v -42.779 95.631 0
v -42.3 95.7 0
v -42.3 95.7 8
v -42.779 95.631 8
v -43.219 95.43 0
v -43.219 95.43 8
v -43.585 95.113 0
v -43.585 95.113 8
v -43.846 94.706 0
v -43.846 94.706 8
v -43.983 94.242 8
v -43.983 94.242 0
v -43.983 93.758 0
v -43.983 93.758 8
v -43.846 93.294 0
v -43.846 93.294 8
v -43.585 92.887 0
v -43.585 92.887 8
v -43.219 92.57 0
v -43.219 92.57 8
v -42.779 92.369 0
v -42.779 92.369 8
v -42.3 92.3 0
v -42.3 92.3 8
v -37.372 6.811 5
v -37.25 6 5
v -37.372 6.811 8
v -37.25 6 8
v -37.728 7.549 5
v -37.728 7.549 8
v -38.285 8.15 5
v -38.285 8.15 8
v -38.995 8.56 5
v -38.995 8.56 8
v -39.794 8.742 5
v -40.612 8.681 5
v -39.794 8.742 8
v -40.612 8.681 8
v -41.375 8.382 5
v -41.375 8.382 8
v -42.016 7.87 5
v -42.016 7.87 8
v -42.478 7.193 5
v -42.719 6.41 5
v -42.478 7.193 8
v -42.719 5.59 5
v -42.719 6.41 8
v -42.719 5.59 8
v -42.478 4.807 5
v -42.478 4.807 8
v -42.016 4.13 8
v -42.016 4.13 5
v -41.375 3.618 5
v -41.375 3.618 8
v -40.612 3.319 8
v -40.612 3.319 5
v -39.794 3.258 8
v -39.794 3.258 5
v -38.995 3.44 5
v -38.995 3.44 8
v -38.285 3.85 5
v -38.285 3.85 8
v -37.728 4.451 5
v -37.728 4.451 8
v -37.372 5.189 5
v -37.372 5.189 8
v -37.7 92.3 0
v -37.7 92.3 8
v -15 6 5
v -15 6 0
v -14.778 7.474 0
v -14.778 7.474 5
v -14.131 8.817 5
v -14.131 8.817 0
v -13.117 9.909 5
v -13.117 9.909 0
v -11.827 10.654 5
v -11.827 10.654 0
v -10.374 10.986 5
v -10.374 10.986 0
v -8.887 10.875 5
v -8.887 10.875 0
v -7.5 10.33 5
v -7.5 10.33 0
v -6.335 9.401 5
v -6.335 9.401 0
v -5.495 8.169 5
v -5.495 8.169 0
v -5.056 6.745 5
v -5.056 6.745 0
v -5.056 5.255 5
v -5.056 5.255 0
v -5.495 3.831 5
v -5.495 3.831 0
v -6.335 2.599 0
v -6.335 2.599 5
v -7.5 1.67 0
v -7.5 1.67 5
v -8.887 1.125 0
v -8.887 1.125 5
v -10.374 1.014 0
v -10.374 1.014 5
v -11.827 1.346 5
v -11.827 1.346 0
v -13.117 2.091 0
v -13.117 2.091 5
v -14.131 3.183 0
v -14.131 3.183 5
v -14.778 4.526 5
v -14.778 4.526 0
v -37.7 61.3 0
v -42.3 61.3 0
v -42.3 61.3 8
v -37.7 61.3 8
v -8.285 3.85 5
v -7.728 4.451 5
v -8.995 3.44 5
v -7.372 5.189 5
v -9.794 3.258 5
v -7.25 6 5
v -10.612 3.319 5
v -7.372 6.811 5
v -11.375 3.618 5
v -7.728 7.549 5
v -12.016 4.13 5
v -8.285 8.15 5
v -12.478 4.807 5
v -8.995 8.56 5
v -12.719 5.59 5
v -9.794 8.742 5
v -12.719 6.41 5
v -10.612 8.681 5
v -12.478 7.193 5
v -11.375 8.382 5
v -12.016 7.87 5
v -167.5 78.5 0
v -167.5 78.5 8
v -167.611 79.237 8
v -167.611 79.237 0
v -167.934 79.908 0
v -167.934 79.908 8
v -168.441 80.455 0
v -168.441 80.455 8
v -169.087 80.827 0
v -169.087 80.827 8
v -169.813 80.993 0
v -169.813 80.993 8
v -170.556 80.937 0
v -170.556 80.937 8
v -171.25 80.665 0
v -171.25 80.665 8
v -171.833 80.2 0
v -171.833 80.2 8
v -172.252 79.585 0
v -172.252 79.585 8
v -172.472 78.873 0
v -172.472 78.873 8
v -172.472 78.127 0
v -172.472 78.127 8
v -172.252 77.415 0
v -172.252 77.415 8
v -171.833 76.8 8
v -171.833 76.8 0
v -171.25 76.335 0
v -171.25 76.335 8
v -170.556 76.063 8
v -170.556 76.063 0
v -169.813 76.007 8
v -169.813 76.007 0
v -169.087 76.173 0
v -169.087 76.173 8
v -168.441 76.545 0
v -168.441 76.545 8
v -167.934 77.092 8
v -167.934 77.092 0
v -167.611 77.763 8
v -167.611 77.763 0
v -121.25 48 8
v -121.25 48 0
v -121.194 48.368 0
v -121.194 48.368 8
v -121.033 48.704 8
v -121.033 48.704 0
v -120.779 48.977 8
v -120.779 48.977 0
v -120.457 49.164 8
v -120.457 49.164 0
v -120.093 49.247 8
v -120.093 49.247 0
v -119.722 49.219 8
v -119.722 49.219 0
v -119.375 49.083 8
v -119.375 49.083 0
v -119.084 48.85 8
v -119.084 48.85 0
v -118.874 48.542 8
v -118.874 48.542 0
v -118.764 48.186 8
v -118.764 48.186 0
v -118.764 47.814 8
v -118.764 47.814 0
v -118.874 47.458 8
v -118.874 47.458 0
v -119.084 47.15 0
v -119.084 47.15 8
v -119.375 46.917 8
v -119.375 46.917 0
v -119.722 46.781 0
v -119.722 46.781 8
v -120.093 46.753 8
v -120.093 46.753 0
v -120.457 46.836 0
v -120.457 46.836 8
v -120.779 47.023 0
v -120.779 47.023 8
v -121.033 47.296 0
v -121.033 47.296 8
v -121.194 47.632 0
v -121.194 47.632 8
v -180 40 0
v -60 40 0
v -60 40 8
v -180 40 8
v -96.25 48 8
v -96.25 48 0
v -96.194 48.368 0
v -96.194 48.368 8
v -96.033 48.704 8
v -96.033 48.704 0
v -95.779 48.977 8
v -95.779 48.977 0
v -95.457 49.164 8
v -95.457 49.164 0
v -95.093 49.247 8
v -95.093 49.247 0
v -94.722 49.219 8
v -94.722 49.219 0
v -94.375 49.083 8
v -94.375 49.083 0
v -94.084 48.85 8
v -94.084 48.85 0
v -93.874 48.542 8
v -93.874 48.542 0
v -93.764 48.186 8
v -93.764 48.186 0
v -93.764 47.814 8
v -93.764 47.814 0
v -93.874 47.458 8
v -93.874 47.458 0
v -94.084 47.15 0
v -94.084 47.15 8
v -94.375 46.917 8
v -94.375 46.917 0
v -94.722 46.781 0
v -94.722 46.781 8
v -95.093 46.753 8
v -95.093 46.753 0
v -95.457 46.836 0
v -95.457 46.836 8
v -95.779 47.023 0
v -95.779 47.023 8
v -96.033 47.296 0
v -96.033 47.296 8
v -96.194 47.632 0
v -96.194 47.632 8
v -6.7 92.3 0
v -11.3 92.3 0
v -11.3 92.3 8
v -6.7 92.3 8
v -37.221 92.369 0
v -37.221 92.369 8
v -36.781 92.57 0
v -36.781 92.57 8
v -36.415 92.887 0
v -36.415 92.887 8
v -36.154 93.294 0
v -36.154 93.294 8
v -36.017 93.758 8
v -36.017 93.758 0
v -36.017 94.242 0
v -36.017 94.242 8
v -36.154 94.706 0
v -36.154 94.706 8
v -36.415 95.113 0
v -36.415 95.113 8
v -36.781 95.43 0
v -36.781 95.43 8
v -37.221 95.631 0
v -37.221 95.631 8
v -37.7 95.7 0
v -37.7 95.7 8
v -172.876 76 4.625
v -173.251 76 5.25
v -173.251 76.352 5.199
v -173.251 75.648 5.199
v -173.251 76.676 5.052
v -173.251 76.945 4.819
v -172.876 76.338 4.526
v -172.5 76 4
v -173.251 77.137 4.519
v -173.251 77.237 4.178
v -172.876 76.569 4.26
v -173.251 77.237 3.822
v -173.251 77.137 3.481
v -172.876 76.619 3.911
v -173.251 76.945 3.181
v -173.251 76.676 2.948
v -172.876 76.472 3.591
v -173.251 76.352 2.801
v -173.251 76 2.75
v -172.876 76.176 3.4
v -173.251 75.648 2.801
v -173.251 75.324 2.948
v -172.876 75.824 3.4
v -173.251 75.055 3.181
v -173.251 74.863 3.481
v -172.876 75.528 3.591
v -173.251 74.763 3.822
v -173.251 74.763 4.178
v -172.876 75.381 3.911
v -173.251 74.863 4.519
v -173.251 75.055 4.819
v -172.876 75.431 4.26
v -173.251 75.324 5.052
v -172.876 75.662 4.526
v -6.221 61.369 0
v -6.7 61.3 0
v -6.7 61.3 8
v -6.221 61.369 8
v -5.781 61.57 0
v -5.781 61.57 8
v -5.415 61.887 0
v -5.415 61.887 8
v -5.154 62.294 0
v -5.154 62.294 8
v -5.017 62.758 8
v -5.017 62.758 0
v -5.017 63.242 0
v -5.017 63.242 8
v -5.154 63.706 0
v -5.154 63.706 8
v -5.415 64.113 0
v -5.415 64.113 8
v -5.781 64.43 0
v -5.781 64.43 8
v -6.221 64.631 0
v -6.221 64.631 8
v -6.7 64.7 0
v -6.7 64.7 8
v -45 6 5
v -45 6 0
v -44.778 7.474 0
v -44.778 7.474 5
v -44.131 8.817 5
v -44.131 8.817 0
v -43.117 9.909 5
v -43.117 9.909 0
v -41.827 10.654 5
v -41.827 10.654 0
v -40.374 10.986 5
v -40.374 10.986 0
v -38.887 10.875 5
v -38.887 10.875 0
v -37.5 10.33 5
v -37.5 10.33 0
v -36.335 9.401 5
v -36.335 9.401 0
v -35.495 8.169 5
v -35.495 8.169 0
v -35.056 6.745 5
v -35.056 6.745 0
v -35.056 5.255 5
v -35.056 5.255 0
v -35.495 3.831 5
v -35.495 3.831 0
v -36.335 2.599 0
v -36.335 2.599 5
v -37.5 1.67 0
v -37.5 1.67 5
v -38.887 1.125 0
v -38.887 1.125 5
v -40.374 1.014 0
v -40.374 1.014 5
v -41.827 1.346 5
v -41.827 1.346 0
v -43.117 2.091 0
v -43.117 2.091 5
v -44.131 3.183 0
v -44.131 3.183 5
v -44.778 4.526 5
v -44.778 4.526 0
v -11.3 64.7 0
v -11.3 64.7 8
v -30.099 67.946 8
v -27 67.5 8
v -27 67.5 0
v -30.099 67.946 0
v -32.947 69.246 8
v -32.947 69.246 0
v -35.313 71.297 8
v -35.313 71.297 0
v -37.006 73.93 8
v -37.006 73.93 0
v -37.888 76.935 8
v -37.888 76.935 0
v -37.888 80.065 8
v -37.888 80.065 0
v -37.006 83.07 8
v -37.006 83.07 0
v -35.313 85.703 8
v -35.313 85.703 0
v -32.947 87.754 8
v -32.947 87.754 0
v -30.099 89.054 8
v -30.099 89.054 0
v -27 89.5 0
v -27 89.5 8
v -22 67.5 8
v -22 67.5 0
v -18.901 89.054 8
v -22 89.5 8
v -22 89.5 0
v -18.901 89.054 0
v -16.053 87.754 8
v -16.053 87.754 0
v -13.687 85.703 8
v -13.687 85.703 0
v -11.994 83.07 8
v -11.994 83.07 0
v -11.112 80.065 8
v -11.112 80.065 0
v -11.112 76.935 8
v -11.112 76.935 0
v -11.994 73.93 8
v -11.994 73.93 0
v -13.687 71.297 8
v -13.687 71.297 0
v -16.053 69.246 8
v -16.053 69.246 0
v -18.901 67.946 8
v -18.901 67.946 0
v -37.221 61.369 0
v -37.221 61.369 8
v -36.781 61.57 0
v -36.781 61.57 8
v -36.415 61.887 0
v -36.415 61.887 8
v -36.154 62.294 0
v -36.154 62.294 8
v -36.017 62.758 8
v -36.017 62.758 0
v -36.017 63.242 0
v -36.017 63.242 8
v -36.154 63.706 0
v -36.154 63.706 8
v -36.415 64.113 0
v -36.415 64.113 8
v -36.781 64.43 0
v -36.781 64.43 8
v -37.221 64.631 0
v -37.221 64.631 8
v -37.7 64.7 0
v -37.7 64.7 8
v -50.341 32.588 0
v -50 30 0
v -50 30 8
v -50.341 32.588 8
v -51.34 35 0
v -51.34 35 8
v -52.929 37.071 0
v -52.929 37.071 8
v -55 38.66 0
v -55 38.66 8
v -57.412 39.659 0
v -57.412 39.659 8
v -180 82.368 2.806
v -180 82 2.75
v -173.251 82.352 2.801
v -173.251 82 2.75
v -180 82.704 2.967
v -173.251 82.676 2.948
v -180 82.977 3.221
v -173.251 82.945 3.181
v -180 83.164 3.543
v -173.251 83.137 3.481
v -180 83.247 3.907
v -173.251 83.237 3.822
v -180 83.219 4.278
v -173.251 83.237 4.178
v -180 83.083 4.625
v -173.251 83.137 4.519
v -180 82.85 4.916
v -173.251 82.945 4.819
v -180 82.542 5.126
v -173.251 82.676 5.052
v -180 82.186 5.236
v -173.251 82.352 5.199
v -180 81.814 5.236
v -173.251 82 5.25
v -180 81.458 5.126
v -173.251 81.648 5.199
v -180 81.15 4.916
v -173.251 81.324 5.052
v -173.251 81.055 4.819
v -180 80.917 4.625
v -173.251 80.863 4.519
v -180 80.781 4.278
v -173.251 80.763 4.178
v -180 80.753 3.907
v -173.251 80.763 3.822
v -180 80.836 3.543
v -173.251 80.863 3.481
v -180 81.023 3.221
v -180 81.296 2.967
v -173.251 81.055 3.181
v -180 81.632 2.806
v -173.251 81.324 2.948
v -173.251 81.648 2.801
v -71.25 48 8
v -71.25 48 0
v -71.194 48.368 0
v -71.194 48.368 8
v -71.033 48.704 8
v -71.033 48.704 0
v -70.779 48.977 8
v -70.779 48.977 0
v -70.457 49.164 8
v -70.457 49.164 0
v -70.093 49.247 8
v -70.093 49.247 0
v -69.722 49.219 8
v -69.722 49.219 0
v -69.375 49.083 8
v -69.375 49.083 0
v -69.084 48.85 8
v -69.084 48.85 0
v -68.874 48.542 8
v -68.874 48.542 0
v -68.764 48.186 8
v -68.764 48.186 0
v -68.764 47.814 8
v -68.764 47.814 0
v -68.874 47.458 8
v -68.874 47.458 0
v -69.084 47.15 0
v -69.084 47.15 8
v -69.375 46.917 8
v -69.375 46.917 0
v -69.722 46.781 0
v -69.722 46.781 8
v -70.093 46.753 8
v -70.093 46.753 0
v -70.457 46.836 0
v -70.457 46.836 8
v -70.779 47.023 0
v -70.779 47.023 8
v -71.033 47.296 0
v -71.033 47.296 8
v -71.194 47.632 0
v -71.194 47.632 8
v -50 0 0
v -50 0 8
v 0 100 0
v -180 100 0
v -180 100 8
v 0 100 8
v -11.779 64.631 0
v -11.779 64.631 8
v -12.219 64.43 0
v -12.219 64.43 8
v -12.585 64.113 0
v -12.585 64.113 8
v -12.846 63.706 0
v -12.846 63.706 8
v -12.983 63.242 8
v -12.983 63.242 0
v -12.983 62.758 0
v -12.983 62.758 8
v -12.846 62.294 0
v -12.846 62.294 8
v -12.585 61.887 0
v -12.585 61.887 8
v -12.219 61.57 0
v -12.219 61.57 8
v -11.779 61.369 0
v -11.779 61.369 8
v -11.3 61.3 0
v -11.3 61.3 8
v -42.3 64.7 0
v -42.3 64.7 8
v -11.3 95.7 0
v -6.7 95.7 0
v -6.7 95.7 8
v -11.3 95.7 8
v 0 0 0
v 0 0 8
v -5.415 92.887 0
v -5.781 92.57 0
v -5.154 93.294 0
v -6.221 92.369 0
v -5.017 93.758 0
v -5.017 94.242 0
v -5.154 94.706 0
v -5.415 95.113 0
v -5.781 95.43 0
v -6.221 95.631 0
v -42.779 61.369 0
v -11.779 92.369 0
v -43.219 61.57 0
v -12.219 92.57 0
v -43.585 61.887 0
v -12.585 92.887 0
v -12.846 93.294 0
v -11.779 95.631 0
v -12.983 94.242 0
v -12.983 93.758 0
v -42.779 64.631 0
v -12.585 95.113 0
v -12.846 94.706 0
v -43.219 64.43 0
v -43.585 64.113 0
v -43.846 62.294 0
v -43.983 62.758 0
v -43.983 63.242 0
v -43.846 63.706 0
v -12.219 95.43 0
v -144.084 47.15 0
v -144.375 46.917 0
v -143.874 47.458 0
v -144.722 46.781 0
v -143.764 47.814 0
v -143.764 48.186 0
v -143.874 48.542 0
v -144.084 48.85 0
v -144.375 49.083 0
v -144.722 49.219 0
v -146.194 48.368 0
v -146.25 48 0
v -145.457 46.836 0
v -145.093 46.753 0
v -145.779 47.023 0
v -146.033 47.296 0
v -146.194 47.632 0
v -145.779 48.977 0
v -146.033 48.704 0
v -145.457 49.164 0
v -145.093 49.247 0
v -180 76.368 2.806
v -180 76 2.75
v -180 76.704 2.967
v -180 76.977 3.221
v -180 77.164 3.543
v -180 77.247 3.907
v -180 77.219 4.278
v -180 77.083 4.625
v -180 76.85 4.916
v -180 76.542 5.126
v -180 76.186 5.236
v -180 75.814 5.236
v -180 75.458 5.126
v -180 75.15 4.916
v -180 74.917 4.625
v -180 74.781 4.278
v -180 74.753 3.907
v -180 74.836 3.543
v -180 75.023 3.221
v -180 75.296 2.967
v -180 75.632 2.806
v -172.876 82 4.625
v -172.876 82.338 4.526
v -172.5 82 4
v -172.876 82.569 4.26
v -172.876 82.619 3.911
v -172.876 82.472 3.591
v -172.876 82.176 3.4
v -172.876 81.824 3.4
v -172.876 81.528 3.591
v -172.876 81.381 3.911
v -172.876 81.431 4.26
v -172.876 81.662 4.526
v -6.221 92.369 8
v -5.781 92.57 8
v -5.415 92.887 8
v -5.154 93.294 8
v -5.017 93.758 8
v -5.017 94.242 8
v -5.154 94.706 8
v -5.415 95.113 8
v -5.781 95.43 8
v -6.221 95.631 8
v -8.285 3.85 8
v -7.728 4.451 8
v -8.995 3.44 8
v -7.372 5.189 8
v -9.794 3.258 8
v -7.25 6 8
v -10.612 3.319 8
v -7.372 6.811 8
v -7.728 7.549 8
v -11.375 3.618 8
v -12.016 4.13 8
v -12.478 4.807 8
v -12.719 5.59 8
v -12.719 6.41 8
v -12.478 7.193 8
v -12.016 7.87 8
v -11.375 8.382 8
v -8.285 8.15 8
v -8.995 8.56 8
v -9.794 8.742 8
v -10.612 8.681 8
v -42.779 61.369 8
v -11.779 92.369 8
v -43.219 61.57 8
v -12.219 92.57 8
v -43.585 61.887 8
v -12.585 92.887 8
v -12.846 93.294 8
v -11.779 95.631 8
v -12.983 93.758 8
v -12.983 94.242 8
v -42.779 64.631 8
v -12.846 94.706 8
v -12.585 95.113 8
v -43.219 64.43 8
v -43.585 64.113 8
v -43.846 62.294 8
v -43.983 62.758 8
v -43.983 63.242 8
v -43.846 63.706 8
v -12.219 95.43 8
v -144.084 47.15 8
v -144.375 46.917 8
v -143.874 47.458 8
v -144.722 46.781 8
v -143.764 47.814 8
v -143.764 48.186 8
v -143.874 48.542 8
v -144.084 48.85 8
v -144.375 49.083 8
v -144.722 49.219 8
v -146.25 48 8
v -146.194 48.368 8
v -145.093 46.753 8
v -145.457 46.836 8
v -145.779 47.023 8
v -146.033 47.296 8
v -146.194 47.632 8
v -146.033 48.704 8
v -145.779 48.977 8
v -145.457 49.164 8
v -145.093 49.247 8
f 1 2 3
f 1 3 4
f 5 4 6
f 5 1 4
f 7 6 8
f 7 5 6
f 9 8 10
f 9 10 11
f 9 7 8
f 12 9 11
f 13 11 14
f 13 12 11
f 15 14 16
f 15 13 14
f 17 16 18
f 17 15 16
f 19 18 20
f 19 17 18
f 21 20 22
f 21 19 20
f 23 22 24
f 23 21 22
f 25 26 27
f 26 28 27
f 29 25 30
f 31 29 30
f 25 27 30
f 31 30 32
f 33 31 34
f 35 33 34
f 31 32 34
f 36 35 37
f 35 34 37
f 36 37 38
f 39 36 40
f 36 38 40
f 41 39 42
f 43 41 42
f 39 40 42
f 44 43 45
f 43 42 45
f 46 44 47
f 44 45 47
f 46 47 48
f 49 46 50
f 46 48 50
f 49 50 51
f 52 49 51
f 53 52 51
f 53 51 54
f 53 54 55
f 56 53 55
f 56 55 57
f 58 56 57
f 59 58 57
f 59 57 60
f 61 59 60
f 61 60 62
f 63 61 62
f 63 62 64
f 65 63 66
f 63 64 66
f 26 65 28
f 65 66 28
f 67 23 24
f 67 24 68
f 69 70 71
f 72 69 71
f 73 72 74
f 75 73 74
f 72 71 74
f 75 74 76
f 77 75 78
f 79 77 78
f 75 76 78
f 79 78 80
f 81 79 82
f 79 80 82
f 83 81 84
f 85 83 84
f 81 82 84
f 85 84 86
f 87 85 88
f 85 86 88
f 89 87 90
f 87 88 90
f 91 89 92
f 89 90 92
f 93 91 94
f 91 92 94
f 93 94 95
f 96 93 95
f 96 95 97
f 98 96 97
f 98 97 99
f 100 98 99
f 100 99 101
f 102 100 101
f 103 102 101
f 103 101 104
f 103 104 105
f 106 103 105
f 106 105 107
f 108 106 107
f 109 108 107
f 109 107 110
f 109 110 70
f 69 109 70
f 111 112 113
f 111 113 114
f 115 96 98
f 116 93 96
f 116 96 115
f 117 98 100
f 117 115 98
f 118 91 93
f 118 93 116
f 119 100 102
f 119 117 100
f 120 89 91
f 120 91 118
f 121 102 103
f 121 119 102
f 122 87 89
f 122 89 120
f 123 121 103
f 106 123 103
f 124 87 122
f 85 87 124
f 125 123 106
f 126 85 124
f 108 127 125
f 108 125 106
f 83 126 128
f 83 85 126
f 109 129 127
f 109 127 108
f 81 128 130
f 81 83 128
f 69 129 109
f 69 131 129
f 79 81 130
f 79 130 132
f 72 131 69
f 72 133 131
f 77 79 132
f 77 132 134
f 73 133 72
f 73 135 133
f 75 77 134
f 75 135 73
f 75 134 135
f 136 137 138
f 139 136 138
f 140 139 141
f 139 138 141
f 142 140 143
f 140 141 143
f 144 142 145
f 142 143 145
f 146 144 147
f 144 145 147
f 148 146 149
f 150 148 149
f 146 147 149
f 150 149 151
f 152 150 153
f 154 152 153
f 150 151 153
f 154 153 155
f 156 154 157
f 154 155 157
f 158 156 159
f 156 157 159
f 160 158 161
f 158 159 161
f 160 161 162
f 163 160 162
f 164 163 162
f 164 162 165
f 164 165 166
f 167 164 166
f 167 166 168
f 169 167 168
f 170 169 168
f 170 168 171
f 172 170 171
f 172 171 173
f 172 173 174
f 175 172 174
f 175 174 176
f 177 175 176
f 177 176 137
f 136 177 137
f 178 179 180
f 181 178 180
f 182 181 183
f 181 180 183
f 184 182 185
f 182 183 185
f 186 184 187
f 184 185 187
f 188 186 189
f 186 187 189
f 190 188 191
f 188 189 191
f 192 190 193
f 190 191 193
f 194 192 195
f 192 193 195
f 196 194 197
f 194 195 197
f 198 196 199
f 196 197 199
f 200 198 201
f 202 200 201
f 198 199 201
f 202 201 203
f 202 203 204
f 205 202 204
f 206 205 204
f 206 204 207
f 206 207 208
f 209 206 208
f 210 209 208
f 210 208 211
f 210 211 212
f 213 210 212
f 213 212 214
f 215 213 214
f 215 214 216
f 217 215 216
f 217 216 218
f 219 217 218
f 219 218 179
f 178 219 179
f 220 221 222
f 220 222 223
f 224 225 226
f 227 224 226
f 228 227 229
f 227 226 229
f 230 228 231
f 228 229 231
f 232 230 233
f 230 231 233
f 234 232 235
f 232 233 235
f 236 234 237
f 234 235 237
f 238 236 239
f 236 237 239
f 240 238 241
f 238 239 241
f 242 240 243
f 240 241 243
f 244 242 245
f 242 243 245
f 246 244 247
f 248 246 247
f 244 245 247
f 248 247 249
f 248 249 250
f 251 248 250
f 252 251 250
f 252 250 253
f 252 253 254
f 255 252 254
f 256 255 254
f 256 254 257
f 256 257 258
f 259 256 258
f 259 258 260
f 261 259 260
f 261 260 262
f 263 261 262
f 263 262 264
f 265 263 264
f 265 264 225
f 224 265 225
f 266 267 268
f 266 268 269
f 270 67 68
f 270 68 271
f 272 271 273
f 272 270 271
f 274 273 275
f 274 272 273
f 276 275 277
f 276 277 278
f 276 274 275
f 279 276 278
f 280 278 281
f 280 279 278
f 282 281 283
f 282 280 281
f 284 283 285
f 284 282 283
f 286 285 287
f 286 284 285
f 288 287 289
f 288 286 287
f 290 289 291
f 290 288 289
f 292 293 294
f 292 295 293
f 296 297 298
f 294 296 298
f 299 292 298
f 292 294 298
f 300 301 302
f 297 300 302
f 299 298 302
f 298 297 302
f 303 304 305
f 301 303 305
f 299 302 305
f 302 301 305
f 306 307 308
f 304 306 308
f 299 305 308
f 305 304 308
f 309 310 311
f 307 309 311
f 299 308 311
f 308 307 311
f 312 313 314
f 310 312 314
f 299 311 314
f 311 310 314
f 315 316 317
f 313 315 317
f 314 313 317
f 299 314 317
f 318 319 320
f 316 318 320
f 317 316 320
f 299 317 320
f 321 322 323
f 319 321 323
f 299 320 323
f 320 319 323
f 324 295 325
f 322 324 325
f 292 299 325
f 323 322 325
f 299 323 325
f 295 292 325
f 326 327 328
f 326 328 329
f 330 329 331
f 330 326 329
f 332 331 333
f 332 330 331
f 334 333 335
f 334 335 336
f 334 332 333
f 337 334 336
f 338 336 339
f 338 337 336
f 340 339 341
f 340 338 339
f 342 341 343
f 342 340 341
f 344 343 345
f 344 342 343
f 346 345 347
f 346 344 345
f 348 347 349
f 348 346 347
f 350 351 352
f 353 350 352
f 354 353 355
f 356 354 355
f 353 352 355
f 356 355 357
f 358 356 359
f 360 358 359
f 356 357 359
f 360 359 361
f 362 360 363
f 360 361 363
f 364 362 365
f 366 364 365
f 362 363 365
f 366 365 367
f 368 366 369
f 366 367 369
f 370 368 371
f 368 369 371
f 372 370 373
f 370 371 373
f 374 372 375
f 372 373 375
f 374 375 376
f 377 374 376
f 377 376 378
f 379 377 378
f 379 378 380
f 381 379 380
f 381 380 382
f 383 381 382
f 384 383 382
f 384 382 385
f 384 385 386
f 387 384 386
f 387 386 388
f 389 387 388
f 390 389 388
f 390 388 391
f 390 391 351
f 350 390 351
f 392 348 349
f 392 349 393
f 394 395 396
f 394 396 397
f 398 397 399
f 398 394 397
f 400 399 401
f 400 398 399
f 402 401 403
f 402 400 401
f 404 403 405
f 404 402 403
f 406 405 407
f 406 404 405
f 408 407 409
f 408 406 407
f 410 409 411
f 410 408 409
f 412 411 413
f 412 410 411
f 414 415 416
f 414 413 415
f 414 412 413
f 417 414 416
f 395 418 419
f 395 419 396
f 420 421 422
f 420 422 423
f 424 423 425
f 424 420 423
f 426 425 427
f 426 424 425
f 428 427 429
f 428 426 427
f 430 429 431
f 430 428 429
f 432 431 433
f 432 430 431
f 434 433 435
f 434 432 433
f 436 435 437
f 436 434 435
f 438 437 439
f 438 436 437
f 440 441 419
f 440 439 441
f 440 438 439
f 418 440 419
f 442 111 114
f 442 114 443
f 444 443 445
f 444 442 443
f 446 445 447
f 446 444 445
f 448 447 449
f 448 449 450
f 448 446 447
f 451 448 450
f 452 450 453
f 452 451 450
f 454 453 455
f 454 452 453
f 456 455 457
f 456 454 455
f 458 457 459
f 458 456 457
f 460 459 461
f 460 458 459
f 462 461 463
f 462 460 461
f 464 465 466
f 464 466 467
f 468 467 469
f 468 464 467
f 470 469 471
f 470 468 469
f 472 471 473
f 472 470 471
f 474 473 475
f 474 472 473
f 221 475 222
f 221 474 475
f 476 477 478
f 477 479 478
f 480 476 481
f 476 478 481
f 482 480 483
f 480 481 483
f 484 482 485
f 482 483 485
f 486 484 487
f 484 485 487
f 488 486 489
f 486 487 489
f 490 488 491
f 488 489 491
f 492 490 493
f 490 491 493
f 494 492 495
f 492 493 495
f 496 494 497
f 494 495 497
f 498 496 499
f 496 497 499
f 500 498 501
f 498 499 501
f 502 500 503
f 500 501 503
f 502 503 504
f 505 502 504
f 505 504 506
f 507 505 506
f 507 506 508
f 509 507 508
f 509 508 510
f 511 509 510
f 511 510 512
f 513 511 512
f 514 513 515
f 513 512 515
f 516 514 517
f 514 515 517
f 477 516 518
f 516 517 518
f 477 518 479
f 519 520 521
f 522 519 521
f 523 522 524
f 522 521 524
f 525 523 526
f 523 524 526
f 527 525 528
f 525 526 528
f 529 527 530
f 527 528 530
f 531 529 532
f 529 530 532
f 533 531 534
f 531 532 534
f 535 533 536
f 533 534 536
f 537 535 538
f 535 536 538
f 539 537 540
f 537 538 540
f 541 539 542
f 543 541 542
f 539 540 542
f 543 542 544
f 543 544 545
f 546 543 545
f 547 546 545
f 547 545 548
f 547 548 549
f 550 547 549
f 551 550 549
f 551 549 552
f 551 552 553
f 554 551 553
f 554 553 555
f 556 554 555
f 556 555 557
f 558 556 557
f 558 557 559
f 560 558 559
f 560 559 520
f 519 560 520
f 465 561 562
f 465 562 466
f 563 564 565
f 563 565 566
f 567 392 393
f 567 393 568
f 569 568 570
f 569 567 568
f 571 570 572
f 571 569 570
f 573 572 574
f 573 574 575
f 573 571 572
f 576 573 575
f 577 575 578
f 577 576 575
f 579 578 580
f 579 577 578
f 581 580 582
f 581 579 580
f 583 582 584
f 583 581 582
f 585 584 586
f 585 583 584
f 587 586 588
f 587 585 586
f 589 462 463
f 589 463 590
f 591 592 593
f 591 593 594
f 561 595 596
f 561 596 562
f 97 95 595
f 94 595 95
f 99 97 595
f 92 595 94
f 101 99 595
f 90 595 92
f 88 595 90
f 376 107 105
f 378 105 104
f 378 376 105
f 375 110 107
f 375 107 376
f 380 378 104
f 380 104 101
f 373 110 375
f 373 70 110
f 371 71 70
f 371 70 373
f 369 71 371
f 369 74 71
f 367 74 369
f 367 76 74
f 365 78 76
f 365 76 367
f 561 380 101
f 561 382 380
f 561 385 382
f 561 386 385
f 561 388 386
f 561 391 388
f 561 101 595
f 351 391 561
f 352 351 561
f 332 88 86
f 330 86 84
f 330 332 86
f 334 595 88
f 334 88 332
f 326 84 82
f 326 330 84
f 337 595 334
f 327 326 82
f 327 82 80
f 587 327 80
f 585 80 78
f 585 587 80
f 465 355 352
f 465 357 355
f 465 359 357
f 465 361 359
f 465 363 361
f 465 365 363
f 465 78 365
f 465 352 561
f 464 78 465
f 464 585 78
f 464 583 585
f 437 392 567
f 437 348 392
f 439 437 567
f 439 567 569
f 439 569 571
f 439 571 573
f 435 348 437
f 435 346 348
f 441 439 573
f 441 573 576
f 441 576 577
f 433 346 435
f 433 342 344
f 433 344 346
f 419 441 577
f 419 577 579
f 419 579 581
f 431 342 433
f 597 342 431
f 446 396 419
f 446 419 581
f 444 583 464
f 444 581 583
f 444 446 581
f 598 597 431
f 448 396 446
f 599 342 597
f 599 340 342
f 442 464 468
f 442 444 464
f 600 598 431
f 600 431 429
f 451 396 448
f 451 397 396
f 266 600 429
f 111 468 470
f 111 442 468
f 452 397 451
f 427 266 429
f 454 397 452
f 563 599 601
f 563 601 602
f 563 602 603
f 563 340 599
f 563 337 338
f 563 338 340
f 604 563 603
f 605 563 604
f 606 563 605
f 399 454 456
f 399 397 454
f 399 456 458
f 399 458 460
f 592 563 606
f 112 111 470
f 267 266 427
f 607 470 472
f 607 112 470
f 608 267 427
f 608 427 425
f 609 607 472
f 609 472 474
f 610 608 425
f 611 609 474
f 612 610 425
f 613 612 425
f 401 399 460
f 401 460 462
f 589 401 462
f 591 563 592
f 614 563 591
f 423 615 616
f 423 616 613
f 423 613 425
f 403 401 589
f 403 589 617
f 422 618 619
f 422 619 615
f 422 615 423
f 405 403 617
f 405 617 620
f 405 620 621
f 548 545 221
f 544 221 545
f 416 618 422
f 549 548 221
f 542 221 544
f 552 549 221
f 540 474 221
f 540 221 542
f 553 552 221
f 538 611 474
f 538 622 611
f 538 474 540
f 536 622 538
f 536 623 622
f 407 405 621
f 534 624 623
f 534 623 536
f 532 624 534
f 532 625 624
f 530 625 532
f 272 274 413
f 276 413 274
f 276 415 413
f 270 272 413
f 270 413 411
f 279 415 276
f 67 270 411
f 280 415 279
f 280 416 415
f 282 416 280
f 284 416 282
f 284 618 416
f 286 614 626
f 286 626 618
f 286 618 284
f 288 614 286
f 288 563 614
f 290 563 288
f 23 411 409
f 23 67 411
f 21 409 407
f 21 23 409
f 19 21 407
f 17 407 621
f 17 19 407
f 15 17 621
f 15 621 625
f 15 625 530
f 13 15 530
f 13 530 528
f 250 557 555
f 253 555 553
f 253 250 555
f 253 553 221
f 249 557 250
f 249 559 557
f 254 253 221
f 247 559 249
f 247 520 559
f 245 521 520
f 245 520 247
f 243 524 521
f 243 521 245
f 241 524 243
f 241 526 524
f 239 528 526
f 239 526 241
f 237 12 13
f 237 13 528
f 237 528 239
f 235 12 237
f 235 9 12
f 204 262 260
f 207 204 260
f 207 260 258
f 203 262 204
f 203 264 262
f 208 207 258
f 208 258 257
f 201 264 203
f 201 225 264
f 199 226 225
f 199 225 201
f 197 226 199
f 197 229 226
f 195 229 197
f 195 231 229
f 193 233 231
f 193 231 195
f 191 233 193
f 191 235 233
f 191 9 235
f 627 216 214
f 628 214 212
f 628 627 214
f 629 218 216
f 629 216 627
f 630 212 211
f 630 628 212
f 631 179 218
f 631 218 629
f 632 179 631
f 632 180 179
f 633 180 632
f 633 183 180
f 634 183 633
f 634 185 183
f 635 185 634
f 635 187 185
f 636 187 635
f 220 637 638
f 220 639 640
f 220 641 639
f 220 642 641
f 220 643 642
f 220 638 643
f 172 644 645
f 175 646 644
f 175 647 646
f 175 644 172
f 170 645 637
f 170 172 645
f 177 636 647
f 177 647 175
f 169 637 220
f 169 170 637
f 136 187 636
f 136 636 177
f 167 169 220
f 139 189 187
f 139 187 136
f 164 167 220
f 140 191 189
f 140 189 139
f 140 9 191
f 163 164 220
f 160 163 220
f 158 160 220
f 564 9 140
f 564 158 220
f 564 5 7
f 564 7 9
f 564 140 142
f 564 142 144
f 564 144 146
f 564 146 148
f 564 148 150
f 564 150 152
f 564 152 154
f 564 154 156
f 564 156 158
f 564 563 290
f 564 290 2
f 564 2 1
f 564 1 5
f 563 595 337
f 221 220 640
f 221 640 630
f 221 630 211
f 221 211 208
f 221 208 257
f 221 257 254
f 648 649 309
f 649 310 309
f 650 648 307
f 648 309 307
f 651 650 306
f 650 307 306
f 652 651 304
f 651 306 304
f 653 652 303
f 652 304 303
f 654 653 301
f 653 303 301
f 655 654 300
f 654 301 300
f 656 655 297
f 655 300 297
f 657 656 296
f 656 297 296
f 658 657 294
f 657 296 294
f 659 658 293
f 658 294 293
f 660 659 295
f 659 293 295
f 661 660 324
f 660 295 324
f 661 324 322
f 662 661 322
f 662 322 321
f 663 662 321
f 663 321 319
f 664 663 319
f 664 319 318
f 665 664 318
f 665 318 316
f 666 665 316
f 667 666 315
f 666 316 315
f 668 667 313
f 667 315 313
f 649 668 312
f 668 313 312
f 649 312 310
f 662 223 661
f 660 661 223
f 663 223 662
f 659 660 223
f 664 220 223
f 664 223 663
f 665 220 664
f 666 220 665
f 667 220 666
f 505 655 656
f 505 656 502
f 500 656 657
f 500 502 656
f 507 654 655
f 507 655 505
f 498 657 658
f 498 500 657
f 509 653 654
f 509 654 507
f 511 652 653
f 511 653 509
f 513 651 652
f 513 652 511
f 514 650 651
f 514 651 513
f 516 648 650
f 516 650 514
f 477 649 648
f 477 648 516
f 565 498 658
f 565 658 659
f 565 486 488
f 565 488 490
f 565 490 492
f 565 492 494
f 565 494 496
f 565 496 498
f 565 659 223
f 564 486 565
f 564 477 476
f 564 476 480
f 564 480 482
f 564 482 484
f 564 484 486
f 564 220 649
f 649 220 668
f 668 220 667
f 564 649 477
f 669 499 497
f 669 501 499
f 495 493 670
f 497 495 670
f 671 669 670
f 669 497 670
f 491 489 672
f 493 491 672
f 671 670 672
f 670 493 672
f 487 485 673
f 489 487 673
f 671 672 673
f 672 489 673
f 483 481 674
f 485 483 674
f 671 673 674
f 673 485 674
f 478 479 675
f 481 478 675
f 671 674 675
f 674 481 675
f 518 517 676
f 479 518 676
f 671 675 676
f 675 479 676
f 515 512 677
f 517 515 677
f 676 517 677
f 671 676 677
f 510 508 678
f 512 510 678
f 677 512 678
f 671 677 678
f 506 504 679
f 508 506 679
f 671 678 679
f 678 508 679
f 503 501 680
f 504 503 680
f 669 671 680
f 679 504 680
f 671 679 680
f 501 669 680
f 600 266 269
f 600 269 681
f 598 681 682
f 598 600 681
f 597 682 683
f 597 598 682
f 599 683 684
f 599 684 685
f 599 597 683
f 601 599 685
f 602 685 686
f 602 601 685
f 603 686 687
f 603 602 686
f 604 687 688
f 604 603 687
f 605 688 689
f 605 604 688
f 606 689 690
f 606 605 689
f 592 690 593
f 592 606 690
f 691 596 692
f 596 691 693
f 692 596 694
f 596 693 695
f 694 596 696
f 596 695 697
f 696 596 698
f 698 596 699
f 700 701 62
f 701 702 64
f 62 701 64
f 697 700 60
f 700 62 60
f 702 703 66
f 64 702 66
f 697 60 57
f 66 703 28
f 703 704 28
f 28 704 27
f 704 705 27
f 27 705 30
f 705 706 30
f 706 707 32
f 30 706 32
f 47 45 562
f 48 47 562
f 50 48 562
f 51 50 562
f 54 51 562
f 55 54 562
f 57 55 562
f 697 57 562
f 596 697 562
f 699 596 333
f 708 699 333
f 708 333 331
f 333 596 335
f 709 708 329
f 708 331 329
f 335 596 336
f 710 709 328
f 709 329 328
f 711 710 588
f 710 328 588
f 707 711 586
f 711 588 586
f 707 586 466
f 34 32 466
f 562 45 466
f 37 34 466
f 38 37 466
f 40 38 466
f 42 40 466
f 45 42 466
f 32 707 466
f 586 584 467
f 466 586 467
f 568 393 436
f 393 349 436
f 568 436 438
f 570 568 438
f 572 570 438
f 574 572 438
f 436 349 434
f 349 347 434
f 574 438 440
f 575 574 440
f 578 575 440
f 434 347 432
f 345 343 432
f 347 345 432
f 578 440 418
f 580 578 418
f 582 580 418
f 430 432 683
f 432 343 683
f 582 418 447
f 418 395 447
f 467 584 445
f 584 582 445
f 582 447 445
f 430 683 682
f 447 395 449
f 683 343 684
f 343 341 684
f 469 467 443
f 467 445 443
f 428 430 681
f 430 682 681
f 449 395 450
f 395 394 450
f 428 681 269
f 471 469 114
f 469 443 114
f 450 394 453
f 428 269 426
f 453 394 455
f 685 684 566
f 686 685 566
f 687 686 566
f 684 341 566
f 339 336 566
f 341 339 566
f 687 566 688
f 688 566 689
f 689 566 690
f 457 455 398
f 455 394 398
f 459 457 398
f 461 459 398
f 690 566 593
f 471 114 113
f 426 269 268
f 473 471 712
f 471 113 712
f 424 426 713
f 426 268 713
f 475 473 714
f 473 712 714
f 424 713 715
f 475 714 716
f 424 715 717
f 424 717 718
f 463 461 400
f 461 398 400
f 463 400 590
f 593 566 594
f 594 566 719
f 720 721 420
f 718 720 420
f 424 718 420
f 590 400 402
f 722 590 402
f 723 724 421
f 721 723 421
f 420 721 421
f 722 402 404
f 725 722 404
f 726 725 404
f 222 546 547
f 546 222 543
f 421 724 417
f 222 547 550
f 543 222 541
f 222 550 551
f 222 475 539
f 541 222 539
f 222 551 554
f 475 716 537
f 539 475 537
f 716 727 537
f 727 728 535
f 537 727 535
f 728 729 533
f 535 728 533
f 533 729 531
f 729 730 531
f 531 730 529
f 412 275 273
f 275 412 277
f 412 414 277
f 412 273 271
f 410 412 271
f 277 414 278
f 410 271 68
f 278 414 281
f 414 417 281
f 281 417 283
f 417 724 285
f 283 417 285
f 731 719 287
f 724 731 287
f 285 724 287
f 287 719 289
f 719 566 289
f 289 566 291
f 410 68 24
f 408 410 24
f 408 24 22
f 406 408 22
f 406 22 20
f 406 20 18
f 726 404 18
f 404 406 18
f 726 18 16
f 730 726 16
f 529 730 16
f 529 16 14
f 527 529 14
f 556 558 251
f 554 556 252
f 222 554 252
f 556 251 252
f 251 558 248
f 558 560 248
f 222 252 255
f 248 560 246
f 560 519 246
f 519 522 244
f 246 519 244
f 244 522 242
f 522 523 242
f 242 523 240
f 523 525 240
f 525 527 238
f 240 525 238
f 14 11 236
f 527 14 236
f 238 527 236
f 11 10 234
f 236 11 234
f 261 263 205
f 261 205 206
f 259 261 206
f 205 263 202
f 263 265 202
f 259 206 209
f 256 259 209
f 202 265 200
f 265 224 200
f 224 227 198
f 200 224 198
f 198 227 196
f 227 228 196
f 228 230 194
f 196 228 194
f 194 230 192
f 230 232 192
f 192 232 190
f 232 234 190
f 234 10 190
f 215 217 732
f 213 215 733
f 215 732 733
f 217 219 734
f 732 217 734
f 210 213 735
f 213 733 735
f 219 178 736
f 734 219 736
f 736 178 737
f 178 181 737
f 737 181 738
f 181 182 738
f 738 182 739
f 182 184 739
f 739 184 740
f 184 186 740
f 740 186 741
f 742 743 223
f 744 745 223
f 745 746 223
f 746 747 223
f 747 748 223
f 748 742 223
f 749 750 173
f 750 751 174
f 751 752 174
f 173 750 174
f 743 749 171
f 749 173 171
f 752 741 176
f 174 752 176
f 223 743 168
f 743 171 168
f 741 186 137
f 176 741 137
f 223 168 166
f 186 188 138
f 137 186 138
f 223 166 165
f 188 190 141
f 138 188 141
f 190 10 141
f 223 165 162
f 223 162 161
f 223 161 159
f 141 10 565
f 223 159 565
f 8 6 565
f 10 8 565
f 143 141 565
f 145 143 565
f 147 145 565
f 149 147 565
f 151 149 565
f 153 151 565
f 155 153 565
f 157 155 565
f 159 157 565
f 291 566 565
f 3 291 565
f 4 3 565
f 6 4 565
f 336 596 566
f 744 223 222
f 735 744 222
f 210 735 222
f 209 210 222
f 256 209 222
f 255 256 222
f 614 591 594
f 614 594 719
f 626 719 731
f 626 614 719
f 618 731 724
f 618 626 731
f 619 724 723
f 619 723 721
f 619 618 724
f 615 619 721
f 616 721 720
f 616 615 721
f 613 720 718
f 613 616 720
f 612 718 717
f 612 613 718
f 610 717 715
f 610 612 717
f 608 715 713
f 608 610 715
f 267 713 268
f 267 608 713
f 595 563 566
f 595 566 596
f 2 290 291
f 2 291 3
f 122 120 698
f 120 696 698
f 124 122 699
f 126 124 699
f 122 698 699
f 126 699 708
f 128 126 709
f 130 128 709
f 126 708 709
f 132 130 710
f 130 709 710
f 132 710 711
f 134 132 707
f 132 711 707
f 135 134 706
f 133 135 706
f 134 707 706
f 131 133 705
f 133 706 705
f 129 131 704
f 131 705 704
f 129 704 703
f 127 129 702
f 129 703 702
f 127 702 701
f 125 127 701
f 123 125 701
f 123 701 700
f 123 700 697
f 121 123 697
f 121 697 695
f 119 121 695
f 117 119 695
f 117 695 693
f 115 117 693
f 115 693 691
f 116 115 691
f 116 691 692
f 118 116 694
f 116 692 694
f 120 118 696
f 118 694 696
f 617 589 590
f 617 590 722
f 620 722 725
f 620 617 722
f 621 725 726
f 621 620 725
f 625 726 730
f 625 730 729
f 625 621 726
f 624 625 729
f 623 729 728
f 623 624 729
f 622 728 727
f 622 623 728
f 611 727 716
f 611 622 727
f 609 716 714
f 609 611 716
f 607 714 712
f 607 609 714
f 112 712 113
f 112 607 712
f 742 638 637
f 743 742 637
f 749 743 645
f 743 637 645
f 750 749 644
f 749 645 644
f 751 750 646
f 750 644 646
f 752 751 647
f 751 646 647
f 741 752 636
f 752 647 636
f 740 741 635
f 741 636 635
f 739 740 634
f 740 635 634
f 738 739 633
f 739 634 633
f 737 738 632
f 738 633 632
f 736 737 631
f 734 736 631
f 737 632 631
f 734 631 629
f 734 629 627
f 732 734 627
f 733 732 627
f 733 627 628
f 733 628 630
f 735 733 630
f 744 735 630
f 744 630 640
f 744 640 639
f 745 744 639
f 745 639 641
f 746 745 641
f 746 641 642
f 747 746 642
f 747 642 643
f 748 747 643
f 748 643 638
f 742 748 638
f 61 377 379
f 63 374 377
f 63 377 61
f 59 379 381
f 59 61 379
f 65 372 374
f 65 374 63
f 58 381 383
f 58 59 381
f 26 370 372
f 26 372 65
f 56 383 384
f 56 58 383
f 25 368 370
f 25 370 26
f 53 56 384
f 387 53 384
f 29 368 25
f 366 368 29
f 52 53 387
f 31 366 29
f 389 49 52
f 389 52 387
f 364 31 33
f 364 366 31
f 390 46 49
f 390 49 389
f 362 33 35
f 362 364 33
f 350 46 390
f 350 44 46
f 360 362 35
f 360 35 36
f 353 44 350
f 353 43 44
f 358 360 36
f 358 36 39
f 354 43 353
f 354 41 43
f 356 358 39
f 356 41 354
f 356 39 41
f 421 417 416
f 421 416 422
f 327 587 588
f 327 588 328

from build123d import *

# Parameters (mm, degrees)
BODY_DEPTH                     = 8
M3_CLEARANCE_SLOT1_DEPTH       = 8
LPATTERN3_COUNT                = 2
LPATTERN3_PITCH                = 31
LPATTERN3_COUNT_DIR2           = 2
LPATTERN3_PITCH_DIR2           = 31
CUT_EXTRUDE1_DEPTH             = 207.067949958
M3X0_5_TAPPED_HOLE1_D          = 2.5
LPATTERN2_COUNT                = 4
LPATTERN2_PITCH                = 25
CBORE_FOR_M5_SHCS1_D           = 5.5
CBORE_FOR_M5_SHCS1_CBORE_D     = 10
CBORE_FOR_M5_SHCS1_CBORE_DEPTH = 5
M3X0_5_TAPPED_HOLE2_D          = 2.5
M3X0_5_TAPPED_HOLE2_DEPTH      = 6.748924226
M3X0_5_TAPPED_HOLE2_TIP        = 0.751075774
SKETCH22_R                     = 2.5
CUT_EXTRUDE2_DEPTH             = 207.067949958


# Read off the part's stored shape, not the designer's step: M3 Clearance Slot1
with BuildPart() as part:
    # Sketch1 → BODY (new body)
    with BuildSketch(Plane.XY):
        with BuildLine():
            Line((-180, 100), (0, 100))
            Line((0, 100), (0, 0))
            Line((0, 0), (-50, 0))
            Line((-50, 0), (-50, 30))
            ThreePointArc((-50, 30), (-52.928932188, 37.071067812), (-60, 40))
            Line((-60, 40), (-180, 40))
            Line((-180, 40), (-180, 100))
        make_face()
    extrude(amount=BODY_DEPTH)

    # M3 Clearance Slot1 outline → M3 Clearance Slot1 (cut)
    with BuildSketch(Plane.XY):
        with BuildLine():
            Line((-42.3, 92.3), (-37.7, 92.3))
            ThreePointArc((-37.7, 92.3), (-36, 94), (-37.7, 95.7))
            Line((-37.7, 95.7), (-42.3, 95.7))
            ThreePointArc((-42.3, 95.7), (-44, 94), (-42.3, 92.3))
        make_face()
    m3_clearance_slot1 = extrude(amount=M3_CLEARANCE_SLOT1_DEPTH, mode=Mode.SUBTRACT)

    # LPattern3: M3 Clearance Slot1 2 × 2
    with Locations(*[(i * LPATTERN3_PITCH, -j * LPATTERN3_PITCH_DIR2, 0) for i in range(LPATTERN3_COUNT) for j in range(LPATTERN3_COUNT_DIR2) if (i, j) != (0, 0)]):
        add(m3_clearance_slot1, mode=Mode.SUBTRACT)

    # Sketch21 → Cut-Extrude1 (cut, through all)
    with BuildSketch(Plane.XY.offset(8)):
        with BuildLine():
            Line((-27, 89.5), (-22, 89.5))
            ThreePointArc((-22, 89.5), (-11, 78.5), (-22, 67.5))
            Line((-22, 67.5), (-27, 67.5))
            ThreePointArc((-27, 67.5), (-38, 78.5), (-27, 89.5))
        make_face()
    extrude(amount=-CUT_EXTRUDE1_DEPTH, mode=Mode.SUBTRACT)

    # M3x0.5 Tapped Hole1 (through all)
    with Locations(Plane.XY.offset(8)):
        with Locations((-70, 48)):
            m3x0_5_tapped_hole1 = Hole(M3X0_5_TAPPED_HOLE1_D / 2)

    # LPattern2: M3x0.5 Tapped Hole1 ×4
    with Locations(*[(-i * LPATTERN2_PITCH, 0, 0) for i in range(1, LPATTERN2_COUNT)]):
        add(m3x0_5_tapped_hole1, mode=Mode.SUBTRACT)

    # CBORE for M5 SHCS1 (through all)
    with Locations(Plane(origin=(0, 0, 0), x_dir=(-1, 0, 0), z_dir=(0, 0, -1))):
        with Locations((10, 6), (40, 6)):
            CounterBoreHole(CBORE_FOR_M5_SHCS1_D / 2, CBORE_FOR_M5_SHCS1_CBORE_D / 2, CBORE_FOR_M5_SHCS1_CBORE_DEPTH)

    # M3x0.5 Tapped Hole2
    with Locations(Plane.ZY.offset(180)):
        with Locations((4, 82), (4, 76)):
            Hole(M3X0_5_TAPPED_HOLE2_D / 2, depth=M3X0_5_TAPPED_HOLE2_DEPTH)
            with Locations((0, 0, -(M3X0_5_TAPPED_HOLE2_DEPTH + M3X0_5_TAPPED_HOLE2_TIP / 2))):  # 118° drill point
                Cone(0, M3X0_5_TAPPED_HOLE2_D / 2, M3X0_5_TAPPED_HOLE2_TIP, mode=Mode.SUBTRACT)

    # Sketch22 → Cut-Extrude2 (cut, through all)
    with BuildSketch(Plane.XY.offset(8)):
        with Locations((-170, 78.5)):
            Circle(SKETCH22_R)
    extrude(amount=-CUT_EXTRUDE2_DEPTH, mode=Mode.SUBTRACT)


solid = part.part
